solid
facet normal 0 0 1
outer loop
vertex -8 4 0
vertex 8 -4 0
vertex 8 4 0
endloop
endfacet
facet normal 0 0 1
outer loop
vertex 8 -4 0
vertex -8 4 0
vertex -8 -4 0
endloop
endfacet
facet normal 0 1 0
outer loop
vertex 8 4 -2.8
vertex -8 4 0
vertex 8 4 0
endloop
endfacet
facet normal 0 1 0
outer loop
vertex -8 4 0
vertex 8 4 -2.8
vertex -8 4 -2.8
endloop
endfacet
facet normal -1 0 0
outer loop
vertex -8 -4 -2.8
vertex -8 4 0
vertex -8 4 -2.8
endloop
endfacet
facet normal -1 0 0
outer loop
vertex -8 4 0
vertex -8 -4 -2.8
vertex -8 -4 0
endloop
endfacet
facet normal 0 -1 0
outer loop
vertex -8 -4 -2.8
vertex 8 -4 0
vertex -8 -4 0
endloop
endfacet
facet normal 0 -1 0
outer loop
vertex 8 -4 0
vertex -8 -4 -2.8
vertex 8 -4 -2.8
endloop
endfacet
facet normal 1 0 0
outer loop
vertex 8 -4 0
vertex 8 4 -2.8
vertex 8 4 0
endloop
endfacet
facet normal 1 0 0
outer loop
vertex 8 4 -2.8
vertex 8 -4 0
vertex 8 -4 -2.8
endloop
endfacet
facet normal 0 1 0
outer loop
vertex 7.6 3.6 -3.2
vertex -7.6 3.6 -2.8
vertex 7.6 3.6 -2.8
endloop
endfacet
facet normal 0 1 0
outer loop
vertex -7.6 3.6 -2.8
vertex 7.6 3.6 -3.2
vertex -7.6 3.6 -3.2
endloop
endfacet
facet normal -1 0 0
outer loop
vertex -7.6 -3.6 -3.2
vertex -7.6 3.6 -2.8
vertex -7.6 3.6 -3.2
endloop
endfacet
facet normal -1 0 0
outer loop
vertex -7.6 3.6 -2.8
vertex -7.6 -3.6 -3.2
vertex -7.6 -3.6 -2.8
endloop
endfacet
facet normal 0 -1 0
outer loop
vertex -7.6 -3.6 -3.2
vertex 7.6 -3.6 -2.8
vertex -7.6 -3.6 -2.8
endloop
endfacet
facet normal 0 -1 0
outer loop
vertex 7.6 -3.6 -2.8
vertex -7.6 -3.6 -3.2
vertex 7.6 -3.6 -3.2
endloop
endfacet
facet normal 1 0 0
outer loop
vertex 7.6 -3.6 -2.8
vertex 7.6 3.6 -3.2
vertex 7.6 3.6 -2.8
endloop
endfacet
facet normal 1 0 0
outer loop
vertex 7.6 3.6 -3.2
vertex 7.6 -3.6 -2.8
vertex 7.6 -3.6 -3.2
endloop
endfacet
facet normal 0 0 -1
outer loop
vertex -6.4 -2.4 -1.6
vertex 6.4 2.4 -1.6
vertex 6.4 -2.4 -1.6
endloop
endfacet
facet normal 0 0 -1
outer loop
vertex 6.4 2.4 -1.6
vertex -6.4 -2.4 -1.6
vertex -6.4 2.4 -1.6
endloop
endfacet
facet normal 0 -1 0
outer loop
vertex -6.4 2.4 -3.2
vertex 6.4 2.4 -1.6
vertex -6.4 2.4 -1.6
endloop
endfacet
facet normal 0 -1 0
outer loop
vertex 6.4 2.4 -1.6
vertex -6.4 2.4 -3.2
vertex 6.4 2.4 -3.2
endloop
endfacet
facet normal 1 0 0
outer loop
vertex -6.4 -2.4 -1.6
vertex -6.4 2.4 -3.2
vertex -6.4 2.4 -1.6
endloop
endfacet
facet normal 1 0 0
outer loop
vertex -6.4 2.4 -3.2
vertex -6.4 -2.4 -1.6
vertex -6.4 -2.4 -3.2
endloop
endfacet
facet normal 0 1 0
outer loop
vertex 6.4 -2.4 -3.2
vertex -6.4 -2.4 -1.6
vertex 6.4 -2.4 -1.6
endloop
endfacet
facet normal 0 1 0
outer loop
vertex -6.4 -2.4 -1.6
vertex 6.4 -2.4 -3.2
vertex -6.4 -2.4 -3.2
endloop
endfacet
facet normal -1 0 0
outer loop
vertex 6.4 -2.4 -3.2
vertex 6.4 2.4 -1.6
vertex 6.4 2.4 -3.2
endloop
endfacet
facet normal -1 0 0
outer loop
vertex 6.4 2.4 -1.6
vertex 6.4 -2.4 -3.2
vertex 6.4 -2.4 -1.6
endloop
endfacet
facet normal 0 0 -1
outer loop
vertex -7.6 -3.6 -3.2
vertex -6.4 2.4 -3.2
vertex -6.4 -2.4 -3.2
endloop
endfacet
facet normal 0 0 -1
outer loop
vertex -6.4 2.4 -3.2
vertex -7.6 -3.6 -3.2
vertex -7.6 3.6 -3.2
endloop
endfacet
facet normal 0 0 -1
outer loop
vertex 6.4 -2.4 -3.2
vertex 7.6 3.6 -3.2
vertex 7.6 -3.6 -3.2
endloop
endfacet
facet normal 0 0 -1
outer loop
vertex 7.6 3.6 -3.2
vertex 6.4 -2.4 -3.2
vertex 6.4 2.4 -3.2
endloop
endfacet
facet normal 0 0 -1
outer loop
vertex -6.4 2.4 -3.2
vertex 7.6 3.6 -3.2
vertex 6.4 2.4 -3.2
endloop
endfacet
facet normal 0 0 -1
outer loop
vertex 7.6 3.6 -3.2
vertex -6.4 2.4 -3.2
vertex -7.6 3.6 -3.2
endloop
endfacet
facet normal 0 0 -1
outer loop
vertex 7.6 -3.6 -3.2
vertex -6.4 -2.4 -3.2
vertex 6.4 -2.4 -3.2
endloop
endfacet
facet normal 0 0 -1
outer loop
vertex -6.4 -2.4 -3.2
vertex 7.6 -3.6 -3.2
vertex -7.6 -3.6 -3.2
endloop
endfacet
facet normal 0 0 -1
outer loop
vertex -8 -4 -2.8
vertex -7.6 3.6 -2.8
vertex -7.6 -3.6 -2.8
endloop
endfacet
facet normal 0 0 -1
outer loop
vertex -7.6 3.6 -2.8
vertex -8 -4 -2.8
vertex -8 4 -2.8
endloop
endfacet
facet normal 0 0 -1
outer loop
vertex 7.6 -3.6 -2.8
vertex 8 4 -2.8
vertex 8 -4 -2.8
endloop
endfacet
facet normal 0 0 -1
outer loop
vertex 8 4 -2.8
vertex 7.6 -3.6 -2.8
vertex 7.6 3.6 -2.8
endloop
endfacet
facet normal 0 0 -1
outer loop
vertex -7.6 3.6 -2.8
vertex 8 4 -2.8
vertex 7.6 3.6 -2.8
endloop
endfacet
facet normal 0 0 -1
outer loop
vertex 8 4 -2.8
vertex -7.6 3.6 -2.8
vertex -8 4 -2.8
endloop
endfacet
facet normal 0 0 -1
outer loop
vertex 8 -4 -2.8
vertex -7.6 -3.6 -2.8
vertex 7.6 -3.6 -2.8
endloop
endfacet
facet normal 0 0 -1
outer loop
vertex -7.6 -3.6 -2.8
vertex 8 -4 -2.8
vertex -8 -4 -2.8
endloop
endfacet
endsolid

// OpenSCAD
// file: ../p/box5.scad
use <../lib.scad>
function ldraw_lib__box5() = [
// 0 Box with 5 Faces and All Edges
// 0 Name: box5.dat
// 0 Author: James Jessiman
// 0 !LDRAW_ORG Primitive UPDATE 2012-01
// 0 !LICENSE Licensed under CC BY 2.0 and CC BY 4.0 : see CAreadme.txt
// 
// 0 BFC CERTIFY CCW
  [0,"BFC","CERTIFY"],
  [0,"BFC","CCW"],
// 
// 0 !HISTORY 2002-04-03 [sbliss] Modified for BFC compliance
// 0 !HISTORY 2002-04-25 [PTadmin] Official Update 2002-02
// 0 !HISTORY 2007-06-24 [PTadmin] Header formatted for Contributor Agreement
// 0 !HISTORY 2008-07-01 [PTadmin] Official Update 2008-01
// 0 !HISTORY 2012-02-16 [Philo] Changed to CCW
// 0 !HISTORY 2012-03-30 [PTadmin] Official Update 2012-01
// 
// 
// 2 24 1 1 1 -1 1 1
  [2,24,1,1,1,-1,1,1],
// 2 24 -1 1 1 -1 1 -1
  [2,24,-1,1,1,-1,1,-1],
// 2 24 -1 1 -1 1 1 -1
  [2,24,-1,1,-1,1,1,-1],
// 2 24 1 1 -1 1 1 1
  [2,24,1,1,-1,1,1,1],
// 2 24 1 0 1 -1 0 1
  [2,24,1,0,1,-1,0,1],
// 2 24 -1 0 1 -1 0 -1
  [2,24,-1,0,1,-1,0,-1],
// 2 24 -1 0 -1 1 0 -1
  [2,24,-1,0,-1,1,0,-1],
// 2 24 1 0 -1 1 0 1
  [2,24,1,0,-1,1,0,1],
// 2 24 1 0 1 1 1 1
  [2,24,1,0,1,1,1,1],
// 2 24 -1 0 1 -1 1 1
  [2,24,-1,0,1,-1,1,1],
// 2 24 1 0 -1 1 1 -1
  [2,24,1,0,-1,1,1,-1],
// 2 24 -1 0 -1 -1 1 -1
  [2,24,-1,0,-1,-1,1,-1],
// 4 16 -1 1 1 1 1 1 1 1 -1 -1 1 -1
  [4,16,-1,1,1,1,1,1,1,1,-1,-1,1,-1],
// 4 16 -1 1 1 -1 0 1 1 0 1 1 1 1
  [4,16,-1,1,1,-1,0,1,1,0,1,1,1,1],
// 4 16 -1 1 -1 -1 0 -1 -1 0 1 -1 1 1
  [4,16,-1,1,-1,-1,0,-1,-1,0,1,-1,1,1],
// 4 16 1 1 -1 1 0 -1 -1 0 -1 -1 1 -1
  [4,16,1,1,-1,1,0,-1,-1,0,-1,-1,1,-1],
// 4 16 1 1 1 1 0 1 1 0 -1 1 1 -1
  [4,16,1,1,1,1,0,1,1,0,-1,1,1,-1],
];
module ldraw_lib__box5(step=0, col=false, unit=2/5, alt=false, line=0.2, solid=!$preview)
    makepoly(ldraw_lib__box5(), step=step, col=col, unit=unit, alt=alt, line=line, solid=solid);
ldraw_lib__box5(line=0.2);
// file: ../p/box4.scad
use <../lib.scad>
function ldraw_lib__box4() = [
// 0 Box with 4 Faces (2 Parallel Pairs) and All Edges
// 0 Name: box4.dat
// 0 Author: James Jessiman
// 0 !LDRAW_ORG Primitive UPDATE 2012-01
// 0 !LICENSE Licensed under CC BY 2.0 and CC BY 4.0 : see CAreadme.txt
// 
// 0 BFC CERTIFY CCW
  [0,"BFC","CERTIFY"],
  [0,"BFC","CCW"],
// 
// 0 !HISTORY 2002-04-03 [sbliss] Modified for BFC compliance
// 0 !HISTORY 2002-04-25 [PTadmin] Official Update 2002-02
// 0 !HISTORY 2007-06-24 [PTadmin] Header formatted for Contributor Agreement
// 0 !HISTORY 2008-07-01 [PTadmin] Official Update 2008-01
// 0 !HISTORY 2012-02-16 [Philo] Changed to CCW
// 0 !HISTORY 2012-03-30 [PTadmin] Official Update 2012-01
// 
// 
// 2 24 1 1 1 -1 1 1
  [2,24,1,1,1,-1,1,1],
// 2 24 -1 1 1 -1 1 -1
  [2,24,-1,1,1,-1,1,-1],
// 2 24 -1 1 -1 1 1 -1
  [2,24,-1,1,-1,1,1,-1],
// 2 24 1 1 -1 1 1 1
  [2,24,1,1,-1,1,1,1],
// 2 24 1 0 1 -1 0 1
  [2,24,1,0,1,-1,0,1],
// 2 24 -1 0 1 -1 0 -1
  [2,24,-1,0,1,-1,0,-1],
// 2 24 -1 0 -1 1 0 -1
  [2,24,-1,0,-1,1,0,-1],
// 2 24 1 0 -1 1 0 1
  [2,24,1,0,-1,1,0,1],
// 2 24 1 0 1 1 1 1
  [2,24,1,0,1,1,1,1],
// 2 24 -1 0 1 -1 1 1
  [2,24,-1,0,1,-1,1,1],
// 2 24 1 0 -1 1 1 -1
  [2,24,1,0,-1,1,1,-1],
// 2 24 -1 0 -1 -1 1 -1
  [2,24,-1,0,-1,-1,1,-1],
// 4 16 -1 1 1 -1 0 1 1 0 1 1 1 1
  [4,16,-1,1,1,-1,0,1,1,0,1,1,1,1],
// 4 16 -1 1 -1 -1 0 -1 -1 0 1 -1 1 1
  [4,16,-1,1,-1,-1,0,-1,-1,0,1,-1,1,1],
// 4 16 1 1 -1 1 0 -1 -1 0 -1 -1 1 -1
  [4,16,1,1,-1,1,0,-1,-1,0,-1,-1,1,-1],
// 4 16 1 1 1 1 0 1 1 0 -1 1 1 -1
  [4,16,1,1,1,1,0,1,1,0,-1,1,1,-1],
];
module ldraw_lib__box4(step=0, col=false, unit=2/5, alt=false, line=0.2, solid=!$preview)
    makepoly(ldraw_lib__box4(), step=step, col=col, unit=unit, alt=alt, line=line, solid=solid);
ldraw_lib__box4(line=0.2);
// file: s/3069bs01.scad
use <../../lib.scad>
use <../../p/box4.scad>
use <../../p/box5.scad>
function ldraw_lib__s__3069bs01() = [
// 0 ~Tile  1 x  2 with Groove without Top Face
// 0 Name: s\3069bs01.dat
// 0 Author: Santeri Piippo [arezey]
// 0 !LDRAW_ORG Subpart UPDATE 2010-02
// 0 !LICENSE Licensed under CC BY 2.0 and CC BY 4.0 : see CAreadme.txt
// 
// 0 BFC CERTIFY CCW
  [0,"BFC","CERTIFY"],
  [0,"BFC","CCW"],
// 
// 0 !HISTORY 2010-07-05 [PTadmin] Official Update 2010-02
// 
// 
// 1 16 0 0 0 20 0 0 0 7 0 0 0 10 box4.dat
  [1,16,0,0,0,20,0,0,0,7,0,0,0,10, ldraw_lib__box4()],
// 1 16 0 7 0 19 0 0 0 1 0 0 0 9 box4.dat
  [1,16,0,7,0,19,0,0,0,1,0,0,0,9, ldraw_lib__box4()],
// 0 BFC INVERTNEXT
  [0,"BFC","INVERTNEXT"],
// 1 16 0 8 0 16 0 0 0 -4 0 0 0 6 box5.dat
  [1,16,0,8,0,16,0,0,0,-4,0,0,0,6, ldraw_lib__box5()],
// 4 16 -19 8 9 -16 8 6 -16 8 -6 -19 8 -9
  [4,16,-19,8,9,-16,8,6,-16,8,-6,-19,8,-9],
// 4 16 19 8 -9 16 8 -6 16 8 6 19 8 9
  [4,16,19,8,-9,16,8,-6,16,8,6,19,8,9],
// 4 16 19 8 9 16 8 6 -16 8 6 -19 8 9
  [4,16,19,8,9,16,8,6,-16,8,6,-19,8,9],
// 4 16 -19 8 -9 -16 8 -6 16 8 -6 19 8 -9
  [4,16,-19,8,-9,-16,8,-6,16,8,-6,19,8,-9],
// 4 16 -20 7 10 -19 7 9 -19 7 -9 -20 7 -10
  [4,16,-20,7,10,-19,7,9,-19,7,-9,-20,7,-10],
// 4 16 20 7 -10 19 7 -9 19 7 9 20 7 10
  [4,16,20,7,-10,19,7,-9,19,7,9,20,7,10],
// 4 16 20 7 10 19 7 9 -19 7 9 -20 7 10
  [4,16,20,7,10,19,7,9,-19,7,9,-20,7,10],
// 4 16 -20 7 -10 -19 7 -9 19 7 -9 20 7 -10
  [4,16,-20,7,-10,-19,7,-9,19,7,-9,20,7,-10],
// 0 //
];
module ldraw_lib__s__3069bs01(step=0, col=false, unit=2/5, alt=false, line=0.2, solid=!$preview)
    makepoly(ldraw_lib__s__3069bs01(), step=step, col=col, unit=unit, alt=alt, line=line, solid=solid);
ldraw_lib__s__3069bs01(line=0.2);
// file: 3069b.scad
use <../lib.scad>
use <s/3069bs01.scad>
function ldraw_lib__3069b() = [
// 0 Tile  1 x  2 with Groove
// 0 Name: 3069b.dat
// 0 Author: Santeri Piippo [arezey]
// 0 !LDRAW_ORG Part UPDATE 2010-02
// 0 !LICENSE Licensed under CC BY 2.0 and CC BY 4.0 : see CAreadme.txt
// 
// 0 BFC CERTIFY CCW
  [0,"BFC","CERTIFY"],
  [0,"BFC","CCW"],
// 
// 0 !HISTORY 2010-07-05 [PTadmin] Official Update 2010-02
// 
// 
// 4 16 20 0 -10 20 0 10 -20 0 10 -20 0 -10
  [4,16,20,0,-10,20,0,10,-20,0,10,-20,0,-10],
// 1 16 0 0 0 1 0 0 0 1 0 0 0 1 s\3069bs01.dat
  [1,16,0,0,0,1,0,0,0,1,0,0,0,1, ldraw_lib__s__3069bs01()],
// 0 //
];
module ldraw_lib__3069b(step=0, col=false, unit=2/5, alt=false, line=0.2, solid=!$preview)
    makepoly(ldraw_lib__3069b(), step=step, col=col, unit=unit, alt=alt, line=line, solid=solid);
ldraw_lib__3069b(line=0.2);
// main file
use <../lib.scad>
use <3069b.scad>
function ldraw_lib__30070() = [
// 0 =Tile  1 x  2 with Groove
// 0 Name: 30070.dat
// 0 Author: Rolf Osterthun [Rolf]
// 0 !LDRAW_ORG Part Alias UPDATE 2013-02
// 0 !LICENSE Licensed under CC BY 2.0 and CC BY 4.0 : see CAreadme.txt
// 
// 0 BFC CERTIFY CCW
  [0,"BFC","CERTIFY"],
  [0,"BFC","CCW"],
// 
// 0 !HISTORY 2013-12-23 [PTadmin] Official Update 2013-02
// 
// 
// 0 // Alias of 3069b
// 0 // Part 30070 is the transparent counterpart of 3069b
// 
// 1 16 0 0 0 1 0 0 0 1 0 0 0 1 3069b.dat
  [1,16,0,0,0,1,0,0,0,1,0,0,0,1, ldraw_lib__3069b()],
];
module ldraw_lib__30070(step=0, col=false, unit=2/5, alt=false, line=0.2, solid=!$preview)
    makepoly(ldraw_lib__30070(), step=step, col=col, unit=unit, alt=alt, line=line, solid=solid);
ldraw_lib__30070(line=0.2);
